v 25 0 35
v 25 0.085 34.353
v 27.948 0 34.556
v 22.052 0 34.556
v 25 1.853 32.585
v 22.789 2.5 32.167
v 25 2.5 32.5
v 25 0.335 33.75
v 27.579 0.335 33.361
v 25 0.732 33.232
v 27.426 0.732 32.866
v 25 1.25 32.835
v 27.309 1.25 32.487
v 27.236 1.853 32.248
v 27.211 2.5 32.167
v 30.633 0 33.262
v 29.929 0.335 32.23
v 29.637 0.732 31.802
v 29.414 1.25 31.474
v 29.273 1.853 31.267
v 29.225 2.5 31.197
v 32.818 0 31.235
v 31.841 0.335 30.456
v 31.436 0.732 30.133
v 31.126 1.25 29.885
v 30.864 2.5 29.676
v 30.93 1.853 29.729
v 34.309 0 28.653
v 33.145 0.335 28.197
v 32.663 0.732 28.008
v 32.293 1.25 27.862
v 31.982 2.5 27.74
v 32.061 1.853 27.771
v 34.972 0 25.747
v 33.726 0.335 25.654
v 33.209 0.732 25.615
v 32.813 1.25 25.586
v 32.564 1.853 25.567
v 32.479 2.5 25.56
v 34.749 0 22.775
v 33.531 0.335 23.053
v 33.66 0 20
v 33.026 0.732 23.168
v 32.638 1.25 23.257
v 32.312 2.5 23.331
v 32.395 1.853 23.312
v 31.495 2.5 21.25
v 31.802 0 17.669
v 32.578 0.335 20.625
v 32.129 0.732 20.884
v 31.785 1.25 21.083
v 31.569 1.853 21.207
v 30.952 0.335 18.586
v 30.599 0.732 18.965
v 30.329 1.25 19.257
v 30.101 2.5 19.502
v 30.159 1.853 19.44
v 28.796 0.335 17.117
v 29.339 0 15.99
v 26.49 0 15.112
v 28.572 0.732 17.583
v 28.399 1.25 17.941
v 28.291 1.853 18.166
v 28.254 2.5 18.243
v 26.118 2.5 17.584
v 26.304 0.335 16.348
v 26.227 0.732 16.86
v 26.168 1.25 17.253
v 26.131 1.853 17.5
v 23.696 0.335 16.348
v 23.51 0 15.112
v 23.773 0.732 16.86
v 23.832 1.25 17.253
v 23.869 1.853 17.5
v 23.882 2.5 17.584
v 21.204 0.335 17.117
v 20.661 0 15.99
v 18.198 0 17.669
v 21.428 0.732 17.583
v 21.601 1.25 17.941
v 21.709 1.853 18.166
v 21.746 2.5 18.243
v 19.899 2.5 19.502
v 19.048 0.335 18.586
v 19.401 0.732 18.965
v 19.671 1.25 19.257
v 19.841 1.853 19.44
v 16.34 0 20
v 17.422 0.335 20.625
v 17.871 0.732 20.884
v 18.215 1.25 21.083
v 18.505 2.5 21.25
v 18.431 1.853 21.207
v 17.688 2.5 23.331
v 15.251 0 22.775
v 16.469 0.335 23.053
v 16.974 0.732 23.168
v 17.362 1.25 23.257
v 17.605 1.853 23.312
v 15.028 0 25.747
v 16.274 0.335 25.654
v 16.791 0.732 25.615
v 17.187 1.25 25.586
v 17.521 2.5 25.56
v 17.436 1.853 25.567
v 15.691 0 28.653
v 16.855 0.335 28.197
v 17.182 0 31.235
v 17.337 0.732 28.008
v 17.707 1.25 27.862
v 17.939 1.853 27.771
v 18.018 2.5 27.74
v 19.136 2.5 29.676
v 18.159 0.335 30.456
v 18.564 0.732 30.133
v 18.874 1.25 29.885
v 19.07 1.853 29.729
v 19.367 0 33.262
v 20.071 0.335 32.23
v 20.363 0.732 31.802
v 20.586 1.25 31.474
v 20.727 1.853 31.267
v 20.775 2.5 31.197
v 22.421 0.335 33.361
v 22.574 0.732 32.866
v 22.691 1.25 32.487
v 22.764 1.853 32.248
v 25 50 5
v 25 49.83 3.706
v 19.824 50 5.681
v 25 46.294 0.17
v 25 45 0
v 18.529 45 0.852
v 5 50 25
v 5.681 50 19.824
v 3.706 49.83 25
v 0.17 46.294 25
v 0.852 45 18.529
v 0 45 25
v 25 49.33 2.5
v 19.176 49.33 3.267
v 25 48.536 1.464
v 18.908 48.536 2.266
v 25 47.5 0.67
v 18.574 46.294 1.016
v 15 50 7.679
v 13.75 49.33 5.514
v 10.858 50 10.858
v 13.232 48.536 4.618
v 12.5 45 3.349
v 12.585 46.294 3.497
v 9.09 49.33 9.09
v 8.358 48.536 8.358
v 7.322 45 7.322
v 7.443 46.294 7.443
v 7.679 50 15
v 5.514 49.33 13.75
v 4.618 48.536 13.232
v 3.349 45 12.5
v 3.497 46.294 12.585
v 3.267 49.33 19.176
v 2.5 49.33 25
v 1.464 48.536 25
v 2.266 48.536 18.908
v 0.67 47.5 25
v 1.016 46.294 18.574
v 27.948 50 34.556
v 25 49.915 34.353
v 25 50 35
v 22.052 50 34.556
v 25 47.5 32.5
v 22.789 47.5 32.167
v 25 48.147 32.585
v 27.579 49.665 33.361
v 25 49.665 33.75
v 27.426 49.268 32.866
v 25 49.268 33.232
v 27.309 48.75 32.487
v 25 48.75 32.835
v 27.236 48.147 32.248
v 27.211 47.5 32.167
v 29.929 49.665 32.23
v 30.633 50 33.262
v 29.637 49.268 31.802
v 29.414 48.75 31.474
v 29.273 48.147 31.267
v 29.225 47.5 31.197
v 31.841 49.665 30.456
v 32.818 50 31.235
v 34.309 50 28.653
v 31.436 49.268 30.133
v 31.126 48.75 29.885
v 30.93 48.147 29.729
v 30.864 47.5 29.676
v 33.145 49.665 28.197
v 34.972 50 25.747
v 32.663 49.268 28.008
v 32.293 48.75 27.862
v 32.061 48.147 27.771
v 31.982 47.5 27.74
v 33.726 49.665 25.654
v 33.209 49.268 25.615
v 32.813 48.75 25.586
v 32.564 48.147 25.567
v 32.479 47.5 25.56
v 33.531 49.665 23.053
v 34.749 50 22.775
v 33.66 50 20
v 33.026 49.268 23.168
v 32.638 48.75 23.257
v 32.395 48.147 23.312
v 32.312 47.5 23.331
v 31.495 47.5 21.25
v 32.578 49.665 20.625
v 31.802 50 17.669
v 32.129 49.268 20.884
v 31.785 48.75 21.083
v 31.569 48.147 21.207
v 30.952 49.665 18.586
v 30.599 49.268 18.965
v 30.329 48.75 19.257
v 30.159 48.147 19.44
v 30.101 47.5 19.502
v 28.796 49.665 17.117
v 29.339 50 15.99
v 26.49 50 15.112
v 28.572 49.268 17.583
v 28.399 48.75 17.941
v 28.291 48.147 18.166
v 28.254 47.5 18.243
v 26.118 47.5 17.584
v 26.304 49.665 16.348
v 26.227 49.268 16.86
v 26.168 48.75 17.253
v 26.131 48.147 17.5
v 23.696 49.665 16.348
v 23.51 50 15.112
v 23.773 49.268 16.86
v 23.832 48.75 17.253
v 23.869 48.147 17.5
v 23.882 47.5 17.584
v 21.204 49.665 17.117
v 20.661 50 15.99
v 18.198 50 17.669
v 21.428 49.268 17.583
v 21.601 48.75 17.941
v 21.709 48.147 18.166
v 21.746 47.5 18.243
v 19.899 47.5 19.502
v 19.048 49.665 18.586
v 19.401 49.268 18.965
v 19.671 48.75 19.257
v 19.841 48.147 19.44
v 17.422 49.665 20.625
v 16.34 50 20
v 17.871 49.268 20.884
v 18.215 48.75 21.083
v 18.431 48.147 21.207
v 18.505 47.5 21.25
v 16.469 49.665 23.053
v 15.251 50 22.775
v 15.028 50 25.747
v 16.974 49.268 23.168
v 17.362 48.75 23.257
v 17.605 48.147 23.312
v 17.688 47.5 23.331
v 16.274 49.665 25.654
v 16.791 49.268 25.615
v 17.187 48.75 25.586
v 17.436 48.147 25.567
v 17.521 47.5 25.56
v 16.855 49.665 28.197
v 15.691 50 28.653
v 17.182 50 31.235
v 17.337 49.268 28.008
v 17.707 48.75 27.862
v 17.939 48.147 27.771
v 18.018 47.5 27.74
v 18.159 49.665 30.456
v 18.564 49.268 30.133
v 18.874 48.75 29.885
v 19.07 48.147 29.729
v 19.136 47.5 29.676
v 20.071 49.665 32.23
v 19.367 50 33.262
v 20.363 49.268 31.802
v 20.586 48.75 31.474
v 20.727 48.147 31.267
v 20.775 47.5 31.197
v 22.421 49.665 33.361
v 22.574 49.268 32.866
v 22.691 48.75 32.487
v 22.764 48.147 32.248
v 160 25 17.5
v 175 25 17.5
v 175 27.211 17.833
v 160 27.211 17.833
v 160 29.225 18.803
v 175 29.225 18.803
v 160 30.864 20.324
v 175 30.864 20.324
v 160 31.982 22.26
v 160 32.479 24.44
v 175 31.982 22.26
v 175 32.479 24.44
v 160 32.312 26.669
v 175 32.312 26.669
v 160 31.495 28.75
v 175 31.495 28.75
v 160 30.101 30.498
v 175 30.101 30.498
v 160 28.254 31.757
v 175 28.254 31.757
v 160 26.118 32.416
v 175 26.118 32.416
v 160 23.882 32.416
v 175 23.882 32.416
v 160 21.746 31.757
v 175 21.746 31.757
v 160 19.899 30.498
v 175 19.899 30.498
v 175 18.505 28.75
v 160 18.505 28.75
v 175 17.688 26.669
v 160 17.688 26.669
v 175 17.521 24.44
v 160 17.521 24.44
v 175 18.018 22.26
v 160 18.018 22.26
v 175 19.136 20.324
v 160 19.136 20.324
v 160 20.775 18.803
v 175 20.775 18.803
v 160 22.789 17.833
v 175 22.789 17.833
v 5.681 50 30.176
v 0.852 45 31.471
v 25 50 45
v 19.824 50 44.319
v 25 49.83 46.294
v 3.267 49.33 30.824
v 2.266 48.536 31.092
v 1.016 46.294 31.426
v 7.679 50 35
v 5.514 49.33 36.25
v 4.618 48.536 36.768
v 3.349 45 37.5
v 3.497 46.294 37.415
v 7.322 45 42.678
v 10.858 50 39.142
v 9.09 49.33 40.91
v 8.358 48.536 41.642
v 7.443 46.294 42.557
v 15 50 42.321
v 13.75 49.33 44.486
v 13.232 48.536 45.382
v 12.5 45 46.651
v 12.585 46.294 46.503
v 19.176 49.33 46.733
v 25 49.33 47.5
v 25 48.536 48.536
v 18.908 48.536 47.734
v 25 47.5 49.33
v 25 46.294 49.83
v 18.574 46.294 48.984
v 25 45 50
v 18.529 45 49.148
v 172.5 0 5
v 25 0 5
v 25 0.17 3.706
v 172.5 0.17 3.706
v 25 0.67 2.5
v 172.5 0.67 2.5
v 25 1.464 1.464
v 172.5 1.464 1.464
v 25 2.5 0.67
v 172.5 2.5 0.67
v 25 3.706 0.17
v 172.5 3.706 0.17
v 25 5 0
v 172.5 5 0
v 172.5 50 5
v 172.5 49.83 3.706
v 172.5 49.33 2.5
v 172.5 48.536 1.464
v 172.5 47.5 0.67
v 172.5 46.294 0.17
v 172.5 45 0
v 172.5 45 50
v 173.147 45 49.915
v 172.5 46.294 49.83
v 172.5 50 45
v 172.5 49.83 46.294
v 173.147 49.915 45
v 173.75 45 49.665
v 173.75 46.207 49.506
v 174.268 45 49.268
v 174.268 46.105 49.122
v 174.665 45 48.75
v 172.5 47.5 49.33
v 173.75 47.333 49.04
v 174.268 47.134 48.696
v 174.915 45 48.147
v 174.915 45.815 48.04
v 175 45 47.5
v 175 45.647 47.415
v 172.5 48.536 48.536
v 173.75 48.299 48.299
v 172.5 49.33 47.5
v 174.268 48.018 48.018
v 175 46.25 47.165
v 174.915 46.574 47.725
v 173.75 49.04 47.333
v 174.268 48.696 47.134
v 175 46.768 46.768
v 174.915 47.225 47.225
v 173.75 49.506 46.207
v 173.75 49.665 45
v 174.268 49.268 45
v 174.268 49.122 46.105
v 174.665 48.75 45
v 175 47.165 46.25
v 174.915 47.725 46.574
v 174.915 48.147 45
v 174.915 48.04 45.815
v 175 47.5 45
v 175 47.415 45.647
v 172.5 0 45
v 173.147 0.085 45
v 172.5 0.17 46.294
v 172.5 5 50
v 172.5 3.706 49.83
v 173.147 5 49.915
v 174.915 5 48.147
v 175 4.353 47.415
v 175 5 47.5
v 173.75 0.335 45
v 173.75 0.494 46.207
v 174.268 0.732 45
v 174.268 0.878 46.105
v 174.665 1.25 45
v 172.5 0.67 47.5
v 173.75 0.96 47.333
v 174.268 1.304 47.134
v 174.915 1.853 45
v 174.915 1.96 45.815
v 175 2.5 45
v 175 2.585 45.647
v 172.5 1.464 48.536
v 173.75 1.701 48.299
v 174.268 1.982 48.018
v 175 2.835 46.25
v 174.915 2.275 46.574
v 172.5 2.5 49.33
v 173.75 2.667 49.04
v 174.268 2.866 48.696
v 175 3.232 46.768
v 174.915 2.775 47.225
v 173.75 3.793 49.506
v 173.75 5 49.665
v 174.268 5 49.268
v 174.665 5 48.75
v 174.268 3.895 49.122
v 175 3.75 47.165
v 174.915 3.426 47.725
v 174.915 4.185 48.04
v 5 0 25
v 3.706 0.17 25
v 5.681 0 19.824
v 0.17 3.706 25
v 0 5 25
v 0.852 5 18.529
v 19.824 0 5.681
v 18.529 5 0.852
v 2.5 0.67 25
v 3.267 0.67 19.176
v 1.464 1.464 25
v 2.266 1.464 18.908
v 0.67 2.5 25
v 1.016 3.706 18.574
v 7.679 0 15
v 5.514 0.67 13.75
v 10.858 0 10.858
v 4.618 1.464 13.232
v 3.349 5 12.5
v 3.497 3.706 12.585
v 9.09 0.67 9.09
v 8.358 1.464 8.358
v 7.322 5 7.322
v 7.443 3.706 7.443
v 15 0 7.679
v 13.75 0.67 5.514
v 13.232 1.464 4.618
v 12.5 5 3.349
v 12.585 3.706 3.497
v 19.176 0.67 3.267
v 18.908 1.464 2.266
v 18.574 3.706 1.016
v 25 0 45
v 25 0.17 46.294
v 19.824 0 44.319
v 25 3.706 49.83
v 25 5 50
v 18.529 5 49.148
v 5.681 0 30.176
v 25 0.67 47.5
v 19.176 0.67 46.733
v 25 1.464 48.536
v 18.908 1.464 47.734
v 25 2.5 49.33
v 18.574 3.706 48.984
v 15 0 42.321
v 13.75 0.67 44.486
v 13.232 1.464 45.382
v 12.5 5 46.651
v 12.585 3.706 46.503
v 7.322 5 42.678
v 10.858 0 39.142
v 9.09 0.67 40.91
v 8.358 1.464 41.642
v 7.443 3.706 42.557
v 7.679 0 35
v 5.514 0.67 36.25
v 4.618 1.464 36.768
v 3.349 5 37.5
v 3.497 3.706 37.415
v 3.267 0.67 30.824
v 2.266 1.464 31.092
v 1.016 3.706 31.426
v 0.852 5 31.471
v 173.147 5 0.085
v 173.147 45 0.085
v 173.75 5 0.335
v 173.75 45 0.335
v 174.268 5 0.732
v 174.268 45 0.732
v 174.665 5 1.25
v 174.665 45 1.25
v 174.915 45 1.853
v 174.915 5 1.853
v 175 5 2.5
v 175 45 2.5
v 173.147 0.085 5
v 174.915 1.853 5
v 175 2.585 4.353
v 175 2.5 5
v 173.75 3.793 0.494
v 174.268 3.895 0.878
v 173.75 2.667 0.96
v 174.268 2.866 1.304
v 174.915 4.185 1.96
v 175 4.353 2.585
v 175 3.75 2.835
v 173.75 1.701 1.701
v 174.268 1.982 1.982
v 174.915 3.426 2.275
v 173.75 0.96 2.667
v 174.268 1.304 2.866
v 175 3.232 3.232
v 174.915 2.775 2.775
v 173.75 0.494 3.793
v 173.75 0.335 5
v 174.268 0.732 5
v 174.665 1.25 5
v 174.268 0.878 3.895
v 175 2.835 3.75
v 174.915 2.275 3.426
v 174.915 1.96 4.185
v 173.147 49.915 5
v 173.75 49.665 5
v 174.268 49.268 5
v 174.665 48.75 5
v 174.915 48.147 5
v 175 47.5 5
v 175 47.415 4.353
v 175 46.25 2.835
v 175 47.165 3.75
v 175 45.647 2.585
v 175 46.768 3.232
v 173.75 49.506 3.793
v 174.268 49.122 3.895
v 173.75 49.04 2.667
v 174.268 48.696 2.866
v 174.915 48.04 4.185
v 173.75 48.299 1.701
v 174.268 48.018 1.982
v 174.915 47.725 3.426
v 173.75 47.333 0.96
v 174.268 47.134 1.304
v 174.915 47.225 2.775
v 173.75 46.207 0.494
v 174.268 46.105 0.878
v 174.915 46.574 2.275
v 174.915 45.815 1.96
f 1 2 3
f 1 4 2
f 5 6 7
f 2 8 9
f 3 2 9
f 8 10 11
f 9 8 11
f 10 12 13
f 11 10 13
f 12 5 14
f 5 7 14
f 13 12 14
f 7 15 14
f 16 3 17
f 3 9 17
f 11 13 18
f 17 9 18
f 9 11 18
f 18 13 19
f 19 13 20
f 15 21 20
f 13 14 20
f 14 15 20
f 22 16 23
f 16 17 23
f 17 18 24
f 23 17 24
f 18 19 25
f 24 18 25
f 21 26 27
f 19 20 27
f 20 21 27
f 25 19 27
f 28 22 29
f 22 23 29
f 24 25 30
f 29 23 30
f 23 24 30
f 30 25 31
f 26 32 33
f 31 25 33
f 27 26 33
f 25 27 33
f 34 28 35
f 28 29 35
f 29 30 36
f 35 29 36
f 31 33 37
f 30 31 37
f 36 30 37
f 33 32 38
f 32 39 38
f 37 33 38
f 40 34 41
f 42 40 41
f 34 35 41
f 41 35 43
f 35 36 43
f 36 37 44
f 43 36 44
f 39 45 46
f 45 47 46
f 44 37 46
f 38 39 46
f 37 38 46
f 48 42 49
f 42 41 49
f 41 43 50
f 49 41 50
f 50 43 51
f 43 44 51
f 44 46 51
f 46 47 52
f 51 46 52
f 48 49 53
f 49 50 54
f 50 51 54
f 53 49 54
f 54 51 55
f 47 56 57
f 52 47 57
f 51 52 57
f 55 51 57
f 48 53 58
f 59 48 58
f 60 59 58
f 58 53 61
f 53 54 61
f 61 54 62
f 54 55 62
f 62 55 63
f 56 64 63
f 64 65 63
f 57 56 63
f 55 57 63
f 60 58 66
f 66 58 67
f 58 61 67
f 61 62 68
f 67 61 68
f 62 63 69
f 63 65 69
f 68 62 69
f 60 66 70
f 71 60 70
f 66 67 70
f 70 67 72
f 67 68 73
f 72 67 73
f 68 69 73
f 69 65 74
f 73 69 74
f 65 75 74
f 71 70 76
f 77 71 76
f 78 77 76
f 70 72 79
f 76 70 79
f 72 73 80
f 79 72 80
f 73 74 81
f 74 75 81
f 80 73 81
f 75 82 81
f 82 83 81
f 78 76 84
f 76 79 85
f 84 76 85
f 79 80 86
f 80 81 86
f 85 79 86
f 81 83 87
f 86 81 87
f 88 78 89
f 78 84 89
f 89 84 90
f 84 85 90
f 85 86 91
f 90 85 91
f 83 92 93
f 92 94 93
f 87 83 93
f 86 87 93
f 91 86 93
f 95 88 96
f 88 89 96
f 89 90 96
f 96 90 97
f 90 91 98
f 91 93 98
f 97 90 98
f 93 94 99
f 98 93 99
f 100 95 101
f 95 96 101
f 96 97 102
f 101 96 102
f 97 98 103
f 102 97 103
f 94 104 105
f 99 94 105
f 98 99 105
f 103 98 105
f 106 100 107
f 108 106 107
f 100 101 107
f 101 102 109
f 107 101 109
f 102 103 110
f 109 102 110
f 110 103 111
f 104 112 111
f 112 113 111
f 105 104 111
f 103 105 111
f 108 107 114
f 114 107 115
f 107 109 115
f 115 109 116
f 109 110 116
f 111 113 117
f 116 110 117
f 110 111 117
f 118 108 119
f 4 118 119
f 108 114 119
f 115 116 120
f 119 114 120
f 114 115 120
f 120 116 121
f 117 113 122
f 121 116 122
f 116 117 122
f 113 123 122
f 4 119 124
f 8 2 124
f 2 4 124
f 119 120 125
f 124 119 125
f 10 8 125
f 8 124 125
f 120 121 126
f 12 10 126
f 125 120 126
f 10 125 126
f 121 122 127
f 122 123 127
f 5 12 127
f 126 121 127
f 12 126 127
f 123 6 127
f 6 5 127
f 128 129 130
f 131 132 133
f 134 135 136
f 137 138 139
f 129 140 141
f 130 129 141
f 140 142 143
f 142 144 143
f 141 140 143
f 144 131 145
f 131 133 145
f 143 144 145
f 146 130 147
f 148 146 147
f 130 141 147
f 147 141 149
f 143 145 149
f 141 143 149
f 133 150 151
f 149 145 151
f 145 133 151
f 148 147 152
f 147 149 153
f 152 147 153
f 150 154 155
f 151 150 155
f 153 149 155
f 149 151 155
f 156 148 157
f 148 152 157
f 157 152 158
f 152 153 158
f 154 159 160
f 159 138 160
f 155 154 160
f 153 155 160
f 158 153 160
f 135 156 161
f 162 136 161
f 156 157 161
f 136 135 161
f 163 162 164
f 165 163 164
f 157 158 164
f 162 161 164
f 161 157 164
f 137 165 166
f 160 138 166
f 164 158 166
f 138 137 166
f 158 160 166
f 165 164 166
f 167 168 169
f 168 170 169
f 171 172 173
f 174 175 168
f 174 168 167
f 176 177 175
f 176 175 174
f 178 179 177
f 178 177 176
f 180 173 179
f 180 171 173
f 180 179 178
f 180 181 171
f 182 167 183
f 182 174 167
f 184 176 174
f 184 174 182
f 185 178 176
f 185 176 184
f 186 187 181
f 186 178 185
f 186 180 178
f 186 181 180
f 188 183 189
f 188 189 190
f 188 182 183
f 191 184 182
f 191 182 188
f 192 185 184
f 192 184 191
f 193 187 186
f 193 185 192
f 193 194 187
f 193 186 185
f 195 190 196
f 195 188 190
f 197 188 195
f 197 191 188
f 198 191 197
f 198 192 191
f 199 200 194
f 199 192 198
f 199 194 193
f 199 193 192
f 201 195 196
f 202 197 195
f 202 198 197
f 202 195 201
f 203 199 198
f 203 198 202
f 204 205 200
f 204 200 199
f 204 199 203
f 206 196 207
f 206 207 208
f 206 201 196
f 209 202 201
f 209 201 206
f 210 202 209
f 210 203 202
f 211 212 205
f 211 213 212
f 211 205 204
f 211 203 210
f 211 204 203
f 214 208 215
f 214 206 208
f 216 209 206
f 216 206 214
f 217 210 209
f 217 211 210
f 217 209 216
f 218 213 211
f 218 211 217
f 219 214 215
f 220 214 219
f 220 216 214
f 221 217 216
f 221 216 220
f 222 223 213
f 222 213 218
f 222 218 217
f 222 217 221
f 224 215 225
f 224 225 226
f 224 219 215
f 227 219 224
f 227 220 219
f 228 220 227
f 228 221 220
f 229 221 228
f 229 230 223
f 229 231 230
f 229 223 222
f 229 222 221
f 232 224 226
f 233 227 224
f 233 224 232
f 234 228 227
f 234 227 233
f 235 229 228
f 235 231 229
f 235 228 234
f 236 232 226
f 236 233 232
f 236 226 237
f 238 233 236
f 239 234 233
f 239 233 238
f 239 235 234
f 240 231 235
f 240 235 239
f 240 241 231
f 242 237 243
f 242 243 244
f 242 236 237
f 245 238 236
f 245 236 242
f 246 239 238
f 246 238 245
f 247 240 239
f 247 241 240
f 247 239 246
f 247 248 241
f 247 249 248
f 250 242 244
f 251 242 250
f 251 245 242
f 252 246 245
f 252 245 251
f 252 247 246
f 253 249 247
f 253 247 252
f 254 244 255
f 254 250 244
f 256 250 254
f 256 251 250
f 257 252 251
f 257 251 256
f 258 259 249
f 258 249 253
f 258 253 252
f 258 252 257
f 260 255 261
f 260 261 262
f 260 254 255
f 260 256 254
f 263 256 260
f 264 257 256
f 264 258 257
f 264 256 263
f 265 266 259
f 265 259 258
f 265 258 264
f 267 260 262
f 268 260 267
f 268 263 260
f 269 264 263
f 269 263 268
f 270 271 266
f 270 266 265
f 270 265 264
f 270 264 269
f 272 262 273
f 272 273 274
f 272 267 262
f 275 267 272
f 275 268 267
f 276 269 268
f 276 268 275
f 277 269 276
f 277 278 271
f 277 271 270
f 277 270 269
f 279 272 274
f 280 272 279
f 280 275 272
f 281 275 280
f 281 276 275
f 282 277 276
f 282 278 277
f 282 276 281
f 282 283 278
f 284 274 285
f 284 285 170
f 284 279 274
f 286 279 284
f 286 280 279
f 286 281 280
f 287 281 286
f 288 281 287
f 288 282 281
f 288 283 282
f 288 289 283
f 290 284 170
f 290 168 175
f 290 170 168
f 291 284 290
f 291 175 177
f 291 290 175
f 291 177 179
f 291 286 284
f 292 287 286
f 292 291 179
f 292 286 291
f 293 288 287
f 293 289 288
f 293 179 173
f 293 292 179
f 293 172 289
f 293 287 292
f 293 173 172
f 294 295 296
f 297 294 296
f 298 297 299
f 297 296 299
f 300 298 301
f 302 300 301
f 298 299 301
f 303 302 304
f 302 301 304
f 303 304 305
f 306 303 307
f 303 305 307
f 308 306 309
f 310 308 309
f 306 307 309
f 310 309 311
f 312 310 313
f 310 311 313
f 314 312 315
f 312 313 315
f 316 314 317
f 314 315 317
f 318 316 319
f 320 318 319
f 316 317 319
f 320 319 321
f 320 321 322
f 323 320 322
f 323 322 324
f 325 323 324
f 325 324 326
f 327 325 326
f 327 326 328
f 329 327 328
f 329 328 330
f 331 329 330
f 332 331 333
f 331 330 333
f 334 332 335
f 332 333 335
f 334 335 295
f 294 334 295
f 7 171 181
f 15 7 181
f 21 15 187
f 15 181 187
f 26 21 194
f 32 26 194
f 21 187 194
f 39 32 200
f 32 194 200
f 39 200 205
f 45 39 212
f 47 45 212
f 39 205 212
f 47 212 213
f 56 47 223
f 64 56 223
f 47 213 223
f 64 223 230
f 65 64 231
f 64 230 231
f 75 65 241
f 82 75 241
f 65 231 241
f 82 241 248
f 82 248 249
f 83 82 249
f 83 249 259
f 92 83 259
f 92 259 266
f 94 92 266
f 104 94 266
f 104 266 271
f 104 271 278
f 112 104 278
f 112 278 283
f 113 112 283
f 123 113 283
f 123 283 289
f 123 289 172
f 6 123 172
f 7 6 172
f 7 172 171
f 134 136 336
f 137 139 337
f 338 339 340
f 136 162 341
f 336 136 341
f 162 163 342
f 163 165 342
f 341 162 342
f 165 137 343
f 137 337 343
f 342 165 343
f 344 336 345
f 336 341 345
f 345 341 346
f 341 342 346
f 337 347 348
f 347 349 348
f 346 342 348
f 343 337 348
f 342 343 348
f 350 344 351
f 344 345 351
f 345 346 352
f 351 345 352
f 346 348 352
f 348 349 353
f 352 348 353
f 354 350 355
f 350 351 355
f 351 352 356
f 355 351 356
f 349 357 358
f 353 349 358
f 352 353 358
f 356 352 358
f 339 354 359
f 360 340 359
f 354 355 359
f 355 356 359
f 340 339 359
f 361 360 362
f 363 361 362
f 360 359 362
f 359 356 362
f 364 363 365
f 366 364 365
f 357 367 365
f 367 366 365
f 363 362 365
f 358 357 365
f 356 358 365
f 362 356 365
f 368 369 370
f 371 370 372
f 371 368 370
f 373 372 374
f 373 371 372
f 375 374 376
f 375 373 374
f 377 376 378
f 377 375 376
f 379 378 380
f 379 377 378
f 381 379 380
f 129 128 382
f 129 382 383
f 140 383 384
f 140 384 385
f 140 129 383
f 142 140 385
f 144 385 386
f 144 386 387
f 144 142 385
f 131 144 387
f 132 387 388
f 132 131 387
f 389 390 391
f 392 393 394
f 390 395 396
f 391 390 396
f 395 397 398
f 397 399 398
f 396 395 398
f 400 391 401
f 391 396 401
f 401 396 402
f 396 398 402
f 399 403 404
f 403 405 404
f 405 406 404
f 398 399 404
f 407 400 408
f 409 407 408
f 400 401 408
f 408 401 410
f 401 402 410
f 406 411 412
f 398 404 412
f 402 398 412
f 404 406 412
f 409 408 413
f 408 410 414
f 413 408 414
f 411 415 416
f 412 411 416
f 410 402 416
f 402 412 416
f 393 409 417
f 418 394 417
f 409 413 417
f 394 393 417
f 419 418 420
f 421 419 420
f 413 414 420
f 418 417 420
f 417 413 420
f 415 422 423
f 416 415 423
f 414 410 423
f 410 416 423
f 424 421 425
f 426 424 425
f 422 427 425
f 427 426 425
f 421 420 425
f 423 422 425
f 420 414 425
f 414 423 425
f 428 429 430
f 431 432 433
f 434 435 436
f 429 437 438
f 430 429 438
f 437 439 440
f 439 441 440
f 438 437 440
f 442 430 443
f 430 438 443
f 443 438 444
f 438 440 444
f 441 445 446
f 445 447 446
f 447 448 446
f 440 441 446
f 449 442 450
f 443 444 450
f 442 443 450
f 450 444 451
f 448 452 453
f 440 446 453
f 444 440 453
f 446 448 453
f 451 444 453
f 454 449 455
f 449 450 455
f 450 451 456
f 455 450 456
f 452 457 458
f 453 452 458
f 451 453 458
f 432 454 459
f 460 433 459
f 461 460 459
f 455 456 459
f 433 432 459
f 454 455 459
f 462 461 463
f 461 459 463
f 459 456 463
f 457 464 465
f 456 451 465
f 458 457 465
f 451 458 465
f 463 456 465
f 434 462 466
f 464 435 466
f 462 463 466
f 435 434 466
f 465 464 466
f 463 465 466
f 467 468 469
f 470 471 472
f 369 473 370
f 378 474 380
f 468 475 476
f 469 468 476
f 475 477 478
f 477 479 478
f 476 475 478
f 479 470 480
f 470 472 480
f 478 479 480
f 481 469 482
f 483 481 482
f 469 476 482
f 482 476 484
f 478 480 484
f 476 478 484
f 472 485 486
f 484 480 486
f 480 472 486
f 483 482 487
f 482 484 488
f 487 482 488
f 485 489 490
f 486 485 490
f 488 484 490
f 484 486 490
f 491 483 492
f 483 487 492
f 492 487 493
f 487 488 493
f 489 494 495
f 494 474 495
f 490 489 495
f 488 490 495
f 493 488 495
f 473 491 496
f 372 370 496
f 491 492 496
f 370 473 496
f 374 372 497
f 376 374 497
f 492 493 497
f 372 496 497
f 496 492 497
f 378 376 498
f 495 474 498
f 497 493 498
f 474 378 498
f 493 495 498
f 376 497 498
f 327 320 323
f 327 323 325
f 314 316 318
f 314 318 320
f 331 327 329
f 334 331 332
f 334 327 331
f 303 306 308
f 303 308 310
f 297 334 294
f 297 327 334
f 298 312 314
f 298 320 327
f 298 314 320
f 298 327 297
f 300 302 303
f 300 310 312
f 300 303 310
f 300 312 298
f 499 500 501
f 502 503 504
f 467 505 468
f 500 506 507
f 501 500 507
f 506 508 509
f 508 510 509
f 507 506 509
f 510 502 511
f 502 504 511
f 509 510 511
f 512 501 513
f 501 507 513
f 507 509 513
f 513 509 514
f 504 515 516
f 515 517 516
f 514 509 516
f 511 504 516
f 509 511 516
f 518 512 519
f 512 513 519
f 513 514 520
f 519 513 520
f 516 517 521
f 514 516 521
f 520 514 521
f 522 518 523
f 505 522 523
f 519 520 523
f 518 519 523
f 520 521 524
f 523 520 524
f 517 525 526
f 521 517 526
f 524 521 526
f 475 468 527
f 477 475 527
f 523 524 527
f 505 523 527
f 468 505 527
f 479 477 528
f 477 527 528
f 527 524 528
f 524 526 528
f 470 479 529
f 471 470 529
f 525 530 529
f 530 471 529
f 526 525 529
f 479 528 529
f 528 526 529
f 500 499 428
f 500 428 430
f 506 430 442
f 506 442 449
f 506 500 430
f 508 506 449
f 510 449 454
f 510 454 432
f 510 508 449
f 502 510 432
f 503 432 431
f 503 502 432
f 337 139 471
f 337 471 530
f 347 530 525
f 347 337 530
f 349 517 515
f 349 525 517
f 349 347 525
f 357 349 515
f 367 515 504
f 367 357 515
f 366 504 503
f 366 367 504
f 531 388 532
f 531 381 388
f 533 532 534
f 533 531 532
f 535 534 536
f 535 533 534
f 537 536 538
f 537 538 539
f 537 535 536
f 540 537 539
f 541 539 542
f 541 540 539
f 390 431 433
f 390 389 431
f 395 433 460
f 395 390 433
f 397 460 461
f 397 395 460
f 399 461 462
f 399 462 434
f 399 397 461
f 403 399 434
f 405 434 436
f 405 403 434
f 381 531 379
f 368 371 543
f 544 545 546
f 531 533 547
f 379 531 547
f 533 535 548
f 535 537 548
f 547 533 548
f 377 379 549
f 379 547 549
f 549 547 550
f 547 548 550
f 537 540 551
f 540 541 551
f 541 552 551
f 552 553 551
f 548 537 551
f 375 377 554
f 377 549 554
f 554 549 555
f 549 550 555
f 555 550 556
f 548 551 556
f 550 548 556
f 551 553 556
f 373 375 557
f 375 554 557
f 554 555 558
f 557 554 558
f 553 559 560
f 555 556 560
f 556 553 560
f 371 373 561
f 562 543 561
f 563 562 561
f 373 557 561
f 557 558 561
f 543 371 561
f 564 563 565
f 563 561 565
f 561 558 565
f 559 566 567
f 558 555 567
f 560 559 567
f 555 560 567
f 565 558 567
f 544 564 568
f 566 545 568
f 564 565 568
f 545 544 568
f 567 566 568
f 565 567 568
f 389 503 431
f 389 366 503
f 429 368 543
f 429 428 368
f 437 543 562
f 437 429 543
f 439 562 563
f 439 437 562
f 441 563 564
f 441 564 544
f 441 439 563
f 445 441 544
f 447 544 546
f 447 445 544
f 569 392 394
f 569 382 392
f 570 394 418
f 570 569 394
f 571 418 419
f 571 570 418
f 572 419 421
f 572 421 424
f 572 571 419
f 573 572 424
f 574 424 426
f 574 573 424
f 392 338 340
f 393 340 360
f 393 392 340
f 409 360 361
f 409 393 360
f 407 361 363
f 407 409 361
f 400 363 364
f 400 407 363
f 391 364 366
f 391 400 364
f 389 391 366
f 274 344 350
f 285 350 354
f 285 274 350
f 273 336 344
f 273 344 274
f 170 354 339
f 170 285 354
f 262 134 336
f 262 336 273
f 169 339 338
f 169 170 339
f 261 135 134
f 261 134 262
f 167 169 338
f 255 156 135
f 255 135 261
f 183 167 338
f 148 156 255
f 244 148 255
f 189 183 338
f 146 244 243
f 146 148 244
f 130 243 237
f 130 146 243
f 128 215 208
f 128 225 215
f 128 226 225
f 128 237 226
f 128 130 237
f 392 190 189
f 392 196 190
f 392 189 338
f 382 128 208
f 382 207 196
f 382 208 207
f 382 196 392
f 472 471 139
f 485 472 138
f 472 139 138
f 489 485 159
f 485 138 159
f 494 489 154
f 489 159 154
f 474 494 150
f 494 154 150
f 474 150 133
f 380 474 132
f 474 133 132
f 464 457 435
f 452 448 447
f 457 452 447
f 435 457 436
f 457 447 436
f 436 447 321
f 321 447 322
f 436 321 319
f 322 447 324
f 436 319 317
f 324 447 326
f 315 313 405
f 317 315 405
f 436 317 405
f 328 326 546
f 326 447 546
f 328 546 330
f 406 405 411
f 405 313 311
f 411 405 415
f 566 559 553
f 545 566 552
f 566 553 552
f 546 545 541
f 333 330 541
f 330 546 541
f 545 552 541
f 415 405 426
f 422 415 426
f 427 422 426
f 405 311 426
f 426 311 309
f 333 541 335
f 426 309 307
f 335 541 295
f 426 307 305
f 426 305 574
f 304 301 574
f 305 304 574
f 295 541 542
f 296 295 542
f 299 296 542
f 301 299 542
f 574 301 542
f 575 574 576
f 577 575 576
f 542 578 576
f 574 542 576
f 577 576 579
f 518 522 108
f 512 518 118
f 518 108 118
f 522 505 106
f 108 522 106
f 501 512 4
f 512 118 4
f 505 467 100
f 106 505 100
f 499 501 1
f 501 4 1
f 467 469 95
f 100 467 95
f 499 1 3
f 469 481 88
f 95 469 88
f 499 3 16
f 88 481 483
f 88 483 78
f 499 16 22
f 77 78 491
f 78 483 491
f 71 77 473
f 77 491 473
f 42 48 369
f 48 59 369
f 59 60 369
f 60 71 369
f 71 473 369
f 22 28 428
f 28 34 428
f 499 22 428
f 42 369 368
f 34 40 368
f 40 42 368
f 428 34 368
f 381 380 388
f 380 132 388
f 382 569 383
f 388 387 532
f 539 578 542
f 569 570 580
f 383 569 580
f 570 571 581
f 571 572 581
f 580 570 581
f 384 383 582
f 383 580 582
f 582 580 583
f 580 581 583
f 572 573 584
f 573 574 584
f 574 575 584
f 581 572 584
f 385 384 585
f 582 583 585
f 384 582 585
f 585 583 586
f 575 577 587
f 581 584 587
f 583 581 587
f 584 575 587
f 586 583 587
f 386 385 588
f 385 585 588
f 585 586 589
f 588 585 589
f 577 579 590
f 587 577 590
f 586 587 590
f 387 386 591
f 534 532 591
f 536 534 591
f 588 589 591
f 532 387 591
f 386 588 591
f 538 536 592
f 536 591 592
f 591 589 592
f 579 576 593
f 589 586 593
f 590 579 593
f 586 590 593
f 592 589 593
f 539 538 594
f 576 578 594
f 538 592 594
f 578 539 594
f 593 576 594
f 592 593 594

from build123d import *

# Parameters (mm, degrees)
CROQUIS1_W              = 175
CROQUIS1_H              = 50
SALIENTE_EXTRUIR1_DEPTH = 50
REDONDEO1_R             = 25
CROQUIS2_R              = 7.5
CORTAR_EXTRUIR1_DEPTH   = 15
CROQUIS3_R              = 7.5
CORTAR_EXTRUIR2_DEPTH   = 189.745860882
REDONDEO2_R             = 5
REDONDEO3_R             = 2.5
REDONDEO4_R             = 2.5


with BuildPart() as part:
    # Croquis1 → Saliente-Extruir1 (new body)
    with BuildSketch(Plane.XY):
        with Locations((87.5, 25)):
            Rectangle(CROQUIS1_W, CROQUIS1_H)
    extrude(amount=SALIENTE_EXTRUIR1_DEPTH)

    # Redondeo1
    redondeo1_edges = [part.edges().sort_by_distance(p)[0] for p in [
        (0, 25, 0),
        (0, 25, 50),
    ]]
    fillet(redondeo1_edges, radius=REDONDEO1_R - 0.0001)  # a hair under: the kernel refuses the full size

    # Croquis2 → Cortar-Extruir1 (cut)
    with BuildSketch(Plane(origin=(175, 0, 0), x_dir=(0, 0, -1), z_dir=(1, 0, 0))):
        with Locations((-25, 25)):
            Circle(CROQUIS2_R)
    extrude(amount=-CORTAR_EXTRUIR1_DEPTH, mode=Mode.SUBTRACT)

    # Croquis3 → Cortar-Extruir2 (cut, through all)
    with BuildSketch(Plane(origin=(0, 50, 0), x_dir=(1, 0, 0), z_dir=(0, 1, 0))):
        with Locations(Location((25, -25, 0), (0, 0, 270))):
            Circle(CROQUIS3_R)
    extrude(amount=-CORTAR_EXTRUIR2_DEPTH, mode=Mode.SUBTRACT)

    # Redondeo2
    redondeo2_edges = [part.edges().sort_by_distance(p)[0] for p in [
        (99.99995, 50, 50),
        (99.99995, 0, 0),
        (99.99995, 0, 50),
        (7.322301181, 0, 42.677698819),
        (7.322301181, 0, 7.322301181),
        (7.322301181, 50, 42.677698819),
        (7.322301181, 50, 7.322301181),
        (99.99995, 50, 0),
    ]]
    fillet(redondeo2_edges, radius=REDONDEO2_R)

    # Redondeo3
    redondeo3_edges = [part.edges().sort_by_distance(p)[0] for p in [
        (25, 0, 17.5),
        (25, 50, 17.5),
    ]]
    fillet(redondeo3_edges, radius=REDONDEO3_R)

    # Redondeo4
    redondeo4_edges = [part.edges().sort_by_distance(p)[0] for p in [
        (175, 0, 25),
        (175, 50, 25),
        (175, 25, 0),
        (175, 25, 50),
        (175, 48.535533906, 48.535533906),
        (175, 48.535533906, 1.464466094),
        (175, 1.464466094, 48.535533906),
        (175, 1.464466094, 1.464466094),
    ]]
    fillet(redondeo4_edges, radius=REDONDEO4_R)


solid = part.part
